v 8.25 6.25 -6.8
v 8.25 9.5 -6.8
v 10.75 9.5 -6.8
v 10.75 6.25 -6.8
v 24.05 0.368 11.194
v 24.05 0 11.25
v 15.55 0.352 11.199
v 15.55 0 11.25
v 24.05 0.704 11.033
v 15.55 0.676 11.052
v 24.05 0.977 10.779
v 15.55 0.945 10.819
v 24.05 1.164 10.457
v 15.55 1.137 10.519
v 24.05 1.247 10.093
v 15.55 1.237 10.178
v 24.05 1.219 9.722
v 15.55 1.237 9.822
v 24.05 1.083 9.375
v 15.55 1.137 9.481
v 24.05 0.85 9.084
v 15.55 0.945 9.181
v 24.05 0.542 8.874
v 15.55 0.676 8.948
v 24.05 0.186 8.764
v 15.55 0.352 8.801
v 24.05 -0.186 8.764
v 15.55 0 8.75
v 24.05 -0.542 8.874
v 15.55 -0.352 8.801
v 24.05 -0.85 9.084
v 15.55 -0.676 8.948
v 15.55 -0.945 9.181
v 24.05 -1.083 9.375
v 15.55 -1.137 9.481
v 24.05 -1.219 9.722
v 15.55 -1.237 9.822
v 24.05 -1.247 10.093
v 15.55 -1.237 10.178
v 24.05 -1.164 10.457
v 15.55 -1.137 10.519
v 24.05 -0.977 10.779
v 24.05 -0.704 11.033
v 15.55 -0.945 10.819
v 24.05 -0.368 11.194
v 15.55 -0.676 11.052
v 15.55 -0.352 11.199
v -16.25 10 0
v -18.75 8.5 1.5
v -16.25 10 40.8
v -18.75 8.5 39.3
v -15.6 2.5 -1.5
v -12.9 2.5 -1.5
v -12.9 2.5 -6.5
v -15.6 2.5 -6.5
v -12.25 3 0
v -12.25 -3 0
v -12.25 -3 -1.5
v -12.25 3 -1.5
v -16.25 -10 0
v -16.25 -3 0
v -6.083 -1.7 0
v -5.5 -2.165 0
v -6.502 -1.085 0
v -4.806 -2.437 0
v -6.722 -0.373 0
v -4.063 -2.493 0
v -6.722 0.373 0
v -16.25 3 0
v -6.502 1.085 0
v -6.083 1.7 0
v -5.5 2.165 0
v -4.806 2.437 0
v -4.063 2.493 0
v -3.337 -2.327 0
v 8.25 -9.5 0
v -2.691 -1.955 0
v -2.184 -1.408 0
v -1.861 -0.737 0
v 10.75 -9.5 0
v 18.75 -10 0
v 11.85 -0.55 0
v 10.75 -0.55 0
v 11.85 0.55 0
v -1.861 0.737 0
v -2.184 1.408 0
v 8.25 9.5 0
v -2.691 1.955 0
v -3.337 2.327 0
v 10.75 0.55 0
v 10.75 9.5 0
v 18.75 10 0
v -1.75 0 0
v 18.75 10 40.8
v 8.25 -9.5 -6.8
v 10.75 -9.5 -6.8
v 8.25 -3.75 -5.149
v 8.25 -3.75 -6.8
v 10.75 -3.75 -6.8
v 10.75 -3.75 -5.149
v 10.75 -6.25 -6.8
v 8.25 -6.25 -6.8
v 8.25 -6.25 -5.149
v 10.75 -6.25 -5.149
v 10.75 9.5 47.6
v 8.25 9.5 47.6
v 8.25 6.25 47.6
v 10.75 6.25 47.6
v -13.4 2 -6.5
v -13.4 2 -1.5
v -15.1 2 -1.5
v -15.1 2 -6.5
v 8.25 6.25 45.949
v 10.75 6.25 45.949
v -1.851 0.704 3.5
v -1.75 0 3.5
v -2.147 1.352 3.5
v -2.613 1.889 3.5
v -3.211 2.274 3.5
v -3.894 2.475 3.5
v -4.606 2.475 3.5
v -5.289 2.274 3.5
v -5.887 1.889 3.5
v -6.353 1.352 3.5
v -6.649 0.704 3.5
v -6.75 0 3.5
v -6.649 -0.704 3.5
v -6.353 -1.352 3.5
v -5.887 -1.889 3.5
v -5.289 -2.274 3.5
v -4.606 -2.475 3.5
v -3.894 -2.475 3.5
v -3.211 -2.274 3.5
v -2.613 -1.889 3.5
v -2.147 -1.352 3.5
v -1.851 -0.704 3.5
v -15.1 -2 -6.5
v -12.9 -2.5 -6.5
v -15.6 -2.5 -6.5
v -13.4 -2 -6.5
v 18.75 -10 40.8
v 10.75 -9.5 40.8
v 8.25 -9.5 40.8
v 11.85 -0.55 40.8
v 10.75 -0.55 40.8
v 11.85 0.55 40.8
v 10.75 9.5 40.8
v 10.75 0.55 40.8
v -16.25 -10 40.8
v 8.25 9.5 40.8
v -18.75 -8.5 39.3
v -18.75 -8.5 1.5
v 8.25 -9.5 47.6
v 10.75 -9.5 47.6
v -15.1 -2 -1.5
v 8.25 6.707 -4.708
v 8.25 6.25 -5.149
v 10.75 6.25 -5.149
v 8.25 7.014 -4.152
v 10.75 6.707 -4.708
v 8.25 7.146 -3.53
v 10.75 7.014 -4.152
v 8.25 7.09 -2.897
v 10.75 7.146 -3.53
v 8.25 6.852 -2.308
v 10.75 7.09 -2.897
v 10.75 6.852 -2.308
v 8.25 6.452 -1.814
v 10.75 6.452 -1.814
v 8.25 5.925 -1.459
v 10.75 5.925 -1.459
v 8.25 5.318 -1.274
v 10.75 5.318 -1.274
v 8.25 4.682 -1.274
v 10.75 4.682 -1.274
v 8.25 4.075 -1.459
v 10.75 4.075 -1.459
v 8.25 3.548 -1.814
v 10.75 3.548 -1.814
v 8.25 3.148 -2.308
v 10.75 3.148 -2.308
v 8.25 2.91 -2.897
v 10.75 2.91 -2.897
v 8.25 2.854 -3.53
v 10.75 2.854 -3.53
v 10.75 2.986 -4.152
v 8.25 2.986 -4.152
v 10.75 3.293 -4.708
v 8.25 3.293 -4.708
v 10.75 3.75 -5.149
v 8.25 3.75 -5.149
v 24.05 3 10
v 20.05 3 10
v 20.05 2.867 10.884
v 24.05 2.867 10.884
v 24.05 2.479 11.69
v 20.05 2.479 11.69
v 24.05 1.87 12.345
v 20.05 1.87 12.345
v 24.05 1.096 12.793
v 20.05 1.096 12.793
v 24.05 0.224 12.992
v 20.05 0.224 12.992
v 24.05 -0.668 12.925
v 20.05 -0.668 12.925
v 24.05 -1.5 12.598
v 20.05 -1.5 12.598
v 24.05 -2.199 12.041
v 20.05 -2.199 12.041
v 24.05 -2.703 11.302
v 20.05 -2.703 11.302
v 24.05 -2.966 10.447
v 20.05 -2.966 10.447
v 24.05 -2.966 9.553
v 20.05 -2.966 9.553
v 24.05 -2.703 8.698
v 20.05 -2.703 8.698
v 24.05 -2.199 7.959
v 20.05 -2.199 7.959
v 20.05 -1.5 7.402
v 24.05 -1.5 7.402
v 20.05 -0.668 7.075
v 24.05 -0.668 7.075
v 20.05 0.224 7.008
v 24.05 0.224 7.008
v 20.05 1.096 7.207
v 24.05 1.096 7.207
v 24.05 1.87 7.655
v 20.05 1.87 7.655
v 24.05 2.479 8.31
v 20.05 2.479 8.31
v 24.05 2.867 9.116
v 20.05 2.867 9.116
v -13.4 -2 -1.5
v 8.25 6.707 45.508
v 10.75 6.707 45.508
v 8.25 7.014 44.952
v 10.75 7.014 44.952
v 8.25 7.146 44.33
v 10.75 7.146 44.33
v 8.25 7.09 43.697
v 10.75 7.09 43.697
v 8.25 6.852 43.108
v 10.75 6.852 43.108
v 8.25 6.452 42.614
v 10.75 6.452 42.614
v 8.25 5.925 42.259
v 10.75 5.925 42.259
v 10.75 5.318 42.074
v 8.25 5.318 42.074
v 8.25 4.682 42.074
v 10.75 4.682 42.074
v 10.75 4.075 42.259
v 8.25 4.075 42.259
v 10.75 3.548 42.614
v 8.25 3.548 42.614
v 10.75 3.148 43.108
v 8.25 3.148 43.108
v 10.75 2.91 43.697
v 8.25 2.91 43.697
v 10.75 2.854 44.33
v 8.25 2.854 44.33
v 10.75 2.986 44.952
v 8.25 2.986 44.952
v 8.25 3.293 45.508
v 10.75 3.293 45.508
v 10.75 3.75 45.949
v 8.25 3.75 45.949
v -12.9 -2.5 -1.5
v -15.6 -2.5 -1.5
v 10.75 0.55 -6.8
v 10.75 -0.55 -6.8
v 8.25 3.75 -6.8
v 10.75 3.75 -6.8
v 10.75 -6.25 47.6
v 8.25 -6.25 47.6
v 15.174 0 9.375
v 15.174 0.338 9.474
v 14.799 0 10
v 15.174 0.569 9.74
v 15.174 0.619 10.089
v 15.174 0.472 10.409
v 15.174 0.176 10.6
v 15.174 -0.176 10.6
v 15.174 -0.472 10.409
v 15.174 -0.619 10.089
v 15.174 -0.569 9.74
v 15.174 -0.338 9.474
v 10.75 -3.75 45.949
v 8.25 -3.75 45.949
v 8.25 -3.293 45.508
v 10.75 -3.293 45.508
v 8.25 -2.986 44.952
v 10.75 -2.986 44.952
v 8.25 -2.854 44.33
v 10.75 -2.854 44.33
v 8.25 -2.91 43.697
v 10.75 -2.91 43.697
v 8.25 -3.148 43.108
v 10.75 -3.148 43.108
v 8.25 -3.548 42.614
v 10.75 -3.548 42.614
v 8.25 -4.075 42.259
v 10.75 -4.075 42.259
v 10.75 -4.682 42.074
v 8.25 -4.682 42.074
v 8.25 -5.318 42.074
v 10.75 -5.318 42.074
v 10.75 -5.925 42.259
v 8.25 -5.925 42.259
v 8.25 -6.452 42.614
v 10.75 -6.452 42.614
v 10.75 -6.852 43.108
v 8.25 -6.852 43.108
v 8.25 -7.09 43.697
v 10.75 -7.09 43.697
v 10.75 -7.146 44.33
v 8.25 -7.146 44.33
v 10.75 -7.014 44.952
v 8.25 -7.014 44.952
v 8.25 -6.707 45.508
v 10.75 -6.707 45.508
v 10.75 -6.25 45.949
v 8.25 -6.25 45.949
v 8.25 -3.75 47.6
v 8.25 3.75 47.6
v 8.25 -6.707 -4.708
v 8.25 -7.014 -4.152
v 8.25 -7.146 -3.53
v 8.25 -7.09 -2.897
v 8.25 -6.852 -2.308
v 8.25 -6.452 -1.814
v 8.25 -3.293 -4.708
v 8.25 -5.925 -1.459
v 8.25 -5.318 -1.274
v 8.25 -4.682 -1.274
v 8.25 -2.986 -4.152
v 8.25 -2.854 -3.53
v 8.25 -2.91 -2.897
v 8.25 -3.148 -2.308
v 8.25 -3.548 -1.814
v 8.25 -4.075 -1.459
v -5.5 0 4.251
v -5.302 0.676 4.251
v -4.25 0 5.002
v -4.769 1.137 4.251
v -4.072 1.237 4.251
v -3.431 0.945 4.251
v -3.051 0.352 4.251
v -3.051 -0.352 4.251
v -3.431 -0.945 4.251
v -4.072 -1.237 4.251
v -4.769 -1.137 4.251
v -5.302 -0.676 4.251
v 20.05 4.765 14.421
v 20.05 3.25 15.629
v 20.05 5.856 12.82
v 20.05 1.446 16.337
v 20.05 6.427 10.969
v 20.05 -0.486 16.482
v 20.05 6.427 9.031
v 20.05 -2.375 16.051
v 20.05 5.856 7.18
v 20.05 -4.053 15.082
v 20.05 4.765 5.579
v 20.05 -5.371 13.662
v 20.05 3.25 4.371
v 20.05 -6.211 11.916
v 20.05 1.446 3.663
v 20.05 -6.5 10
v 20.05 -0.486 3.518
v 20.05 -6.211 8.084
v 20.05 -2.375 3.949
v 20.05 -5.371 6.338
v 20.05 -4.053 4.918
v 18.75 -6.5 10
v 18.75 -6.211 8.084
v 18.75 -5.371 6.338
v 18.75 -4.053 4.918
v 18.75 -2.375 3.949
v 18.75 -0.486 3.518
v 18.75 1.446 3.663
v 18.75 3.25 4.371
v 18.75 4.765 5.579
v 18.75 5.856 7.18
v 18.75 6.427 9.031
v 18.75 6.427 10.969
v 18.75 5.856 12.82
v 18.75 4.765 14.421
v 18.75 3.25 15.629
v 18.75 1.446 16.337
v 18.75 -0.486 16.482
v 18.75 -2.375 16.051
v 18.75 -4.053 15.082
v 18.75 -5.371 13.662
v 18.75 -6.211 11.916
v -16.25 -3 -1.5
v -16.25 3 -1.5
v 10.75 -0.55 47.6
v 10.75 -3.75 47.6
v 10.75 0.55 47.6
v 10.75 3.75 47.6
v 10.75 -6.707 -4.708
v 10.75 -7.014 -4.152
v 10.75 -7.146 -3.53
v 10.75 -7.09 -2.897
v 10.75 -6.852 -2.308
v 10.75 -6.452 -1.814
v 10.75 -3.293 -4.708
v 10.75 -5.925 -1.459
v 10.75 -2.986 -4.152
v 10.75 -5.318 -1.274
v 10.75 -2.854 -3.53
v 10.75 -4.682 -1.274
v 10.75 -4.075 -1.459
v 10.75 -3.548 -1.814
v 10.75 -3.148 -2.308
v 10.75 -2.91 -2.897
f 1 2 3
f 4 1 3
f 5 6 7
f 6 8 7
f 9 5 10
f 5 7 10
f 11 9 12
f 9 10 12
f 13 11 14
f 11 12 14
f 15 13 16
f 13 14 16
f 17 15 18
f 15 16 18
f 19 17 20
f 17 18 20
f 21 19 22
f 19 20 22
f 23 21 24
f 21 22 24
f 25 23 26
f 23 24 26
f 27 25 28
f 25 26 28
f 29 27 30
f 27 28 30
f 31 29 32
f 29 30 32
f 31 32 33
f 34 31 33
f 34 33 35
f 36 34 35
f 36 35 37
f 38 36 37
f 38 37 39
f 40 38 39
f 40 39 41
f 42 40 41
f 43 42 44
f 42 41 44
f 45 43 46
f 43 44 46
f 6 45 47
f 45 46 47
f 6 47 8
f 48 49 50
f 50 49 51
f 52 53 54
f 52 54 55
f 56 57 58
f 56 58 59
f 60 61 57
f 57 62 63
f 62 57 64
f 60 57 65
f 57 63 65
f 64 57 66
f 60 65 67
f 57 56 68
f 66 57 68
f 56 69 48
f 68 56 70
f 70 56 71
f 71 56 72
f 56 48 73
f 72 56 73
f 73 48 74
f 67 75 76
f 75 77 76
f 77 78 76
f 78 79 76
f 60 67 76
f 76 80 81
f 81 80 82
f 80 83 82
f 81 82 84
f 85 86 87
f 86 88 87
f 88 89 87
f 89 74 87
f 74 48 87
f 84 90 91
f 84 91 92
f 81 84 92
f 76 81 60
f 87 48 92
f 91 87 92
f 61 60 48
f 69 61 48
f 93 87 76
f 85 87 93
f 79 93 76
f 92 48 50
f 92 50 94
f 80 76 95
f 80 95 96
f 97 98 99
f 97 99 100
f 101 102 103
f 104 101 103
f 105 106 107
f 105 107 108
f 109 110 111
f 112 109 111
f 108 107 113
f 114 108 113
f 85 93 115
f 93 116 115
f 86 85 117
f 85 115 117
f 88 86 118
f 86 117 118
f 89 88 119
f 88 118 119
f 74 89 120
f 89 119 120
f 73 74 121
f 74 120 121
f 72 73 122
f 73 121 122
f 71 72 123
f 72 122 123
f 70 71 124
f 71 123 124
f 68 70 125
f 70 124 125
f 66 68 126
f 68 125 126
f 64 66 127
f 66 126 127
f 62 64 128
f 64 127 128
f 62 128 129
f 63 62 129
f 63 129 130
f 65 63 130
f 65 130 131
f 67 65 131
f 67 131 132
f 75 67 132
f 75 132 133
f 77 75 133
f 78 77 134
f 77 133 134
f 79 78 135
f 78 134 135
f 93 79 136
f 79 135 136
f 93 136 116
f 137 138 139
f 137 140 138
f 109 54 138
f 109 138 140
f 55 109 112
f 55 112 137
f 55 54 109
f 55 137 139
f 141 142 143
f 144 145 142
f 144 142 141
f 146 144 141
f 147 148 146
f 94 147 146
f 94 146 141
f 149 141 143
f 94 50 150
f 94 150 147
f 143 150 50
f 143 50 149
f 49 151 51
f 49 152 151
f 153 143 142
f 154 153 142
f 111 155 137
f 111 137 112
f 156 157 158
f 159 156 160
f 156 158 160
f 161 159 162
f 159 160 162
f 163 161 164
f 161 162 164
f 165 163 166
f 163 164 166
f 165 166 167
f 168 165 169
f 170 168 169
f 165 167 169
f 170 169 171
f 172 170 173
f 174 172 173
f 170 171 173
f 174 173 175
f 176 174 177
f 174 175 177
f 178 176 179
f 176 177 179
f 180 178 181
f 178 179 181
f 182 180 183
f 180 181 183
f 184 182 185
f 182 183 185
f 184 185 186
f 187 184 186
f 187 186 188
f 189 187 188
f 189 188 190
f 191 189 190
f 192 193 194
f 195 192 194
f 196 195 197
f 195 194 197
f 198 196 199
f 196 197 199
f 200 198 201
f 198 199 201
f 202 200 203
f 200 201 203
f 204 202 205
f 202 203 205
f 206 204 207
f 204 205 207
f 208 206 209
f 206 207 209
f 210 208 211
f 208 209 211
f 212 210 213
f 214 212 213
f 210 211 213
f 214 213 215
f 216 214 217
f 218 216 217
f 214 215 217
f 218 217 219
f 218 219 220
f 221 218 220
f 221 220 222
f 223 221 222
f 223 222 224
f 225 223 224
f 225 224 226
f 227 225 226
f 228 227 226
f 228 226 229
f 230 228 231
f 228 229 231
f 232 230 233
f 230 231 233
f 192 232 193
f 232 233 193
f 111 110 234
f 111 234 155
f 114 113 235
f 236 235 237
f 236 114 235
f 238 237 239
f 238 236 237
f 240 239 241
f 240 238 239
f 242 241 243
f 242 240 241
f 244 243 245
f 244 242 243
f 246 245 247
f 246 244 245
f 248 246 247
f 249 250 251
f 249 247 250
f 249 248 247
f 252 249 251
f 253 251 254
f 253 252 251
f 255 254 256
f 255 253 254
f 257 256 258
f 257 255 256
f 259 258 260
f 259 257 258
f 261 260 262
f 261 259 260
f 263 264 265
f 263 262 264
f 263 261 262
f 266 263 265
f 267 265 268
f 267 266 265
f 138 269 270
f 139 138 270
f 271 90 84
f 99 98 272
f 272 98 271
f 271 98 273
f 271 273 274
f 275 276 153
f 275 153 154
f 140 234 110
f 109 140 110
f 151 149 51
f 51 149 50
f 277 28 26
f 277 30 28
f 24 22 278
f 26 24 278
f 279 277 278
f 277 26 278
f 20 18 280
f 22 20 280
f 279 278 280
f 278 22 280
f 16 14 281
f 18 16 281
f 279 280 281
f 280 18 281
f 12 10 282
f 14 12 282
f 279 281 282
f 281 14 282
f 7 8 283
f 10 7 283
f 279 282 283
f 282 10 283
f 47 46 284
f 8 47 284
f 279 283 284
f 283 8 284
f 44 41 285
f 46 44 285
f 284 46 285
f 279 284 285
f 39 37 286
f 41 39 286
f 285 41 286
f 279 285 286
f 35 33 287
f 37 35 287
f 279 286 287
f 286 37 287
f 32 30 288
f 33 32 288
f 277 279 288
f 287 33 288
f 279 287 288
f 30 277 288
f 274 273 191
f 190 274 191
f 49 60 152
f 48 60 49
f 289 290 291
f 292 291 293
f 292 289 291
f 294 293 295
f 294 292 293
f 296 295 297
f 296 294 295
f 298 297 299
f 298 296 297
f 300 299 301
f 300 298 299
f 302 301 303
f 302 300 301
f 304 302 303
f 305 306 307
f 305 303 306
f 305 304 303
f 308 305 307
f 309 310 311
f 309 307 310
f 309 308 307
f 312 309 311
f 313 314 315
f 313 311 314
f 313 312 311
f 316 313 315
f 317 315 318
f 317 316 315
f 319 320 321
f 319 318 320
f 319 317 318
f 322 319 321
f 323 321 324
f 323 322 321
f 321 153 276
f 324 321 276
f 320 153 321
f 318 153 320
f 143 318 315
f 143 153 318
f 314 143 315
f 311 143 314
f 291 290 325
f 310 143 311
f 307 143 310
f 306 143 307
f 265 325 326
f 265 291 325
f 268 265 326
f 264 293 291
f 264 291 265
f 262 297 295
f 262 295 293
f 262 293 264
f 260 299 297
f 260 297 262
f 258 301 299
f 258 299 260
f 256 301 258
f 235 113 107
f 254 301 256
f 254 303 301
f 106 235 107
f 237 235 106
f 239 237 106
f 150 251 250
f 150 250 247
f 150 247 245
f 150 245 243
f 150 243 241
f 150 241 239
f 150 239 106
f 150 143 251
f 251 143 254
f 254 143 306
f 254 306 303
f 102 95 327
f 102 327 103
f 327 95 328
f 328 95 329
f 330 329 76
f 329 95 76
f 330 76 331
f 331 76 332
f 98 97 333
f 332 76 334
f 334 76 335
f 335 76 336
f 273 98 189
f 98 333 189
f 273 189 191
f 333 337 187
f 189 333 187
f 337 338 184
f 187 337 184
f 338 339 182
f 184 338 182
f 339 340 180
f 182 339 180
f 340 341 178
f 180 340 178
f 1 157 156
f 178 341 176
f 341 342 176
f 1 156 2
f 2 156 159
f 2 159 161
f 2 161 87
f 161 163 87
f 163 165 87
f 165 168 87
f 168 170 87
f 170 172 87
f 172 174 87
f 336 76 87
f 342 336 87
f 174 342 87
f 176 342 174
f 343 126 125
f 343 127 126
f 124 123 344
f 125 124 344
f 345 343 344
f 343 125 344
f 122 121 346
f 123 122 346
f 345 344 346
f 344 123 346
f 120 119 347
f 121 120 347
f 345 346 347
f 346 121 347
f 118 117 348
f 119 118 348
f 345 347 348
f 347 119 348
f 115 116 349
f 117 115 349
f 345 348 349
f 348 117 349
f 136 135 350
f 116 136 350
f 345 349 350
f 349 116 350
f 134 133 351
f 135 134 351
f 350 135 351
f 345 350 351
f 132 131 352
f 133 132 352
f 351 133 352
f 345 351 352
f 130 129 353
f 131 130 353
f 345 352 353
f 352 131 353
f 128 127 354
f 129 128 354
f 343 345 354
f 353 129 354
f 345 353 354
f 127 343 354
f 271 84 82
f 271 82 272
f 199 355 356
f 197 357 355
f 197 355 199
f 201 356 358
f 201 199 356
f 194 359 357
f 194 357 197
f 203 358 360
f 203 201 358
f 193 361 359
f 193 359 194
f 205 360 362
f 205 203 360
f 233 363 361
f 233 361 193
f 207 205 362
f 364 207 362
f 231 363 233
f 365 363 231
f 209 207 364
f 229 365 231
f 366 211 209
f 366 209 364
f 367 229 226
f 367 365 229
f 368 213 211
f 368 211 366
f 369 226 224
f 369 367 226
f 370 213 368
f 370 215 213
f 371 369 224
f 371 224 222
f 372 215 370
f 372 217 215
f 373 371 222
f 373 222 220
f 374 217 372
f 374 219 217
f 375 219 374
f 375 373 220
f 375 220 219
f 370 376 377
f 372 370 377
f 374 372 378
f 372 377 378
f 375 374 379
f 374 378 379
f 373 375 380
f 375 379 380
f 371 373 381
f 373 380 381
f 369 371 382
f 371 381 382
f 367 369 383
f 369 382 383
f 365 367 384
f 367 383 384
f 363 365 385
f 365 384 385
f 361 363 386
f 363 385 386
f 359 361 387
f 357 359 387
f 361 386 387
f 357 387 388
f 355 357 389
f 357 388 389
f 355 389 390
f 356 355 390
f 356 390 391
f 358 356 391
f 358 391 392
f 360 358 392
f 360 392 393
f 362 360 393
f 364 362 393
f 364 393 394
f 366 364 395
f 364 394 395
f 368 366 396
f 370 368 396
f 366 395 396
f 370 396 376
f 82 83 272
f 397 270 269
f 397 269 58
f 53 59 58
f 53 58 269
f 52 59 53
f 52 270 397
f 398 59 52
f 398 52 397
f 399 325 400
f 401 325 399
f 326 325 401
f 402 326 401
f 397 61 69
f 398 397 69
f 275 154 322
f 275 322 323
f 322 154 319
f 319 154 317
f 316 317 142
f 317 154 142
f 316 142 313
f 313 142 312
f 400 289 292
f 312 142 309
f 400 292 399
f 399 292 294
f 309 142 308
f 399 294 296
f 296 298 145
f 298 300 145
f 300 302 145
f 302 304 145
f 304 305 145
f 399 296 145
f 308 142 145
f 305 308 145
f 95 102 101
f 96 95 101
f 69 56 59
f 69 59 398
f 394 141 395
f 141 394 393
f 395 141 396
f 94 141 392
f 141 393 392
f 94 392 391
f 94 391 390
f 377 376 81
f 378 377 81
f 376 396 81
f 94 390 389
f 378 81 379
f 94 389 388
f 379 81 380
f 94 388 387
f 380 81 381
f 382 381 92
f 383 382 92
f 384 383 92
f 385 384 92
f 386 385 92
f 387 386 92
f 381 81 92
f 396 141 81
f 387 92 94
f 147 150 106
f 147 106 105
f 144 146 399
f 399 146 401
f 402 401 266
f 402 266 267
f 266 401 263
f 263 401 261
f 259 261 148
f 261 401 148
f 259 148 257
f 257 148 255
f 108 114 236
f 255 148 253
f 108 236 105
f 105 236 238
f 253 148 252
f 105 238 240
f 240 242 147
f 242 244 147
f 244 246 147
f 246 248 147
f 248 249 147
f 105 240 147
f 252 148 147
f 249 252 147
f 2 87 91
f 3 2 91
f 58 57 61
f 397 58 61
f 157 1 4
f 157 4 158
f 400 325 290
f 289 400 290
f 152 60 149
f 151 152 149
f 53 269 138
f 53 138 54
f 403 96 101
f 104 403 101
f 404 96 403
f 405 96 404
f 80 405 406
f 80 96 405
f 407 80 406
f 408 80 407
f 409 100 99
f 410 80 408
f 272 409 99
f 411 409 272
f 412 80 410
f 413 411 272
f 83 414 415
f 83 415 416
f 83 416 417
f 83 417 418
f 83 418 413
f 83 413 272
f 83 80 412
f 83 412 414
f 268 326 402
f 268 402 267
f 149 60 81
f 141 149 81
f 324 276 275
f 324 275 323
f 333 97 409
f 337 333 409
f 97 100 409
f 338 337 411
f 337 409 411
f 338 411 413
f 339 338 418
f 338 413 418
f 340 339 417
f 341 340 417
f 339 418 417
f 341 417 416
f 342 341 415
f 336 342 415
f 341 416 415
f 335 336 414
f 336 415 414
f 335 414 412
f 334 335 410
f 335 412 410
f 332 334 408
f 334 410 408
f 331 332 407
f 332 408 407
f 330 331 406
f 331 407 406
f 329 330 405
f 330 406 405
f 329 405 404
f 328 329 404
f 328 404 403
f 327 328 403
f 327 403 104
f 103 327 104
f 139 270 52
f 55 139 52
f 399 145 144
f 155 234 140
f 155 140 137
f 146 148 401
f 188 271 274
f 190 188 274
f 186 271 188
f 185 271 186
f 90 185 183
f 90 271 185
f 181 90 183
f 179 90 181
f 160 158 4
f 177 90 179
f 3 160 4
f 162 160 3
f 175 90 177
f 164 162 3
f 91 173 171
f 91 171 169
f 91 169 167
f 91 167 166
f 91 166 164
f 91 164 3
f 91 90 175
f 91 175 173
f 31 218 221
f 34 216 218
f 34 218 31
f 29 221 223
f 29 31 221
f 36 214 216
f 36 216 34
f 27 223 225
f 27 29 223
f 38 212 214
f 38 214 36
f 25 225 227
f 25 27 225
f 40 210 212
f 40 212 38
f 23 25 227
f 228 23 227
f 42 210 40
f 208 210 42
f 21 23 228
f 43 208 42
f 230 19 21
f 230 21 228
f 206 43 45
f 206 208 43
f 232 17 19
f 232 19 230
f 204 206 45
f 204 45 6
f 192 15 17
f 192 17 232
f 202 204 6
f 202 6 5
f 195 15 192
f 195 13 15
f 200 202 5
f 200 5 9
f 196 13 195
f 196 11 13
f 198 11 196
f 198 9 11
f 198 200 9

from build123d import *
from OCP.BRepFilletAPI import BRepFilletAPI_MakeChamfer

# Parameters (mm, degrees)
SKIZZE1_W                           = 37.5
SKIZZE1_H                           = 20
AUFSATZ_LINEAR_AUSTRAGEN1_DEPTH     = 40.8
SKIZZE2_W                           = 2.5
SKIZZE2_H                           = 19
AUFSATZ_LINEAR_AUSTRAGEN2_DEPTH     = 6.8
F_4_3_4_3_DIAMETER_HOLE2_AT_2_COUNT = 2
F_4_3_4_3_DIAMETER_HOLE2_AT_2_PITCH = 10
CUT_EXTRUDE1_REACH                  = 58.886
SKETCH1_W                           = 3
SKETCH1_H                           = 2.5
BOSS_EXTRUDE1_DEPTH                 = 0.55
SKIZZE5_R                           = 6.5
AUFSATZ_LINEAR_AUSTRAGEN3_DEPTH     = 1.3
SKIZZE6_R                           = 3
AUFSATZ_LINEAR_AUSTRAGEN4_DEPTH     = 4
SKIZZE7_W                           = 4
SKIZZE7_H                           = 6
AUFSATZ_LINEAR_AUSTRAGEN5_DEPTH     = 1.5
SKIZZE8_W                           = 2.7
SKIZZE8_H                           = 5
SKIZZE8_W_2                         = 1.7
SKIZZE8_H_2                         = 4
AUFSATZ_LINEAR_AUSTRAGEN6_DEPTH     = 5
F_5_0_5_DIAMETER_HOLE1_D            = 5
F_5_0_5_DIAMETER_HOLE1_DEPTH        = 3.5
F_5_0_5_DIAMETER_HOLE1_TIP          = 1.502151548
M3_GEWINDEBOHRUNG1_D                = 2.5
M3_GEWINDEBOHRUNG1_DEPTH            = 8.5
M3_GEWINDEBOHRUNG1_TIP              = 0.751075774
CHAMFER1_SIZE                       = 1.5
CHAMFER1_SIZE_2                     = 2.5


with BuildPart() as part:
    # Skizze1 → Aufsatz-Linear austragen1 (new body)
    with BuildSketch(Plane.XY):
        Rectangle(SKIZZE1_W, SKIZZE1_H)
    extrude(amount=AUFSATZ_LINEAR_AUSTRAGEN1_DEPTH)

    # Skizze2 → Aufsatz-Linear austragen2 (add)
    with BuildSketch(Plane.XY.offset(40.8)):
        with Locations((9.5, 0)):
            Rectangle(SKIZZE2_W, SKIZZE2_H)
    aufsatz_linear_austragen2 = extrude(amount=AUFSATZ_LINEAR_AUSTRAGEN2_DEPTH)

    # Skizze3 → Ø4.3 (4.3) Diameter Hole2 (revolve, cut)
    with BuildSketch(Plane(origin=(10.75, 5, 44.2), x_dir=(0, 0, -1), z_dir=(0, 1, 0))):
        Polygon((0, 0), (0, 11.291850331), (2.15, 10), (2.15, 0), align=None)
    f_4_3_4_3_diameter_hole2 = revolve(axis=Axis((17.1, 5, 44.2), (-1, 0, 0)), mode=Mode.SUBTRACT)

    # Ø4.3 (4.3) Diameter Hole2 at 2: Ø4.3 (4.3) Diameter Hole2 ×2
    with Locations(*[(0, -i * F_4_3_4_3_DIAMETER_HOLE2_AT_2_PITCH, 0) for i in range(1, F_4_3_4_3_DIAMETER_HOLE2_AT_2_COUNT)]):
        add(f_4_3_4_3_diameter_hole2, mode=Mode.SUBTRACT)

    # Sketch1 → Cut-Extrude1 (cut, up to next)
    with BuildSketch(Plane(origin=(10.75, 0, 0), x_dir=(0, 0, -1), z_dir=(1, 0, 0)), mode=Mode.PRIVATE) as cut_extrude1_sk1:
        with Locations((-47.05, 5)):
            Rectangle(SKETCH1_W, SKETCH1_H)
    cut_extrude1_tool1 = extrude(cut_extrude1_sk1.sketch, amount=-CUT_EXTRUDE1_REACH, mode=Mode.PRIVATE) & part.part
    # Sketch1 → Cut-Extrude1 (cut, up to next)
    with BuildSketch(Plane(origin=(10.75, 0, 0), x_dir=(0, 0, -1), z_dir=(1, 0, 0)), mode=Mode.PRIVATE) as cut_extrude1_sk2:
        with Locations((-47.05, -5)):
            Rectangle(SKETCH1_W, SKETCH1_H)
    cut_extrude1_tool2 = extrude(cut_extrude1_sk2.sketch, amount=-CUT_EXTRUDE1_REACH, mode=Mode.PRIVATE) & part.part
    cut_extrude1_1 = cut_extrude1_tool1.solids().sort_by_distance((10.75, 5, 47.05))[0]
    add(cut_extrude1_1, mode=Mode.SUBTRACT)
    cut_extrude1_2 = cut_extrude1_tool2.solids().sort_by_distance((10.75, -5, 47.05))[0]
    add(cut_extrude1_2, mode=Mode.SUBTRACT)
    cut_extrude1 = cut_extrude1_1 + cut_extrude1_2  # Cut-Extrude1 as one shape, for the pattern or mirror that repeats it

    # Spiegeln2: Aufsatz-Linear austragen2, Ø4.3 (4.3) Diameter Hole2, Cut-Extrude1 across plane
    add(aufsatz_linear_austragen2.mirror(Plane(origin=(0, 0, 20.4), x_dir=(1, 0, 0), z_dir=(0, 0, -1))))
    add(f_4_3_4_3_diameter_hole2.mirror(Plane(origin=(0, 0, 20.4), x_dir=(1, 0, 0), z_dir=(0, 0, -1))), mode=Mode.SUBTRACT)
    add(cut_extrude1.mirror(Plane(origin=(0, 0, 20.4), x_dir=(1, 0, 0), z_dir=(0, 0, -1))), mode=Mode.SUBTRACT)

    # Spiegeln2 copy 1 sketch → Spiegeln2 copy 1 (revolve, cut)
    with BuildSketch(Plane(origin=(10.75, -5, -3.4), x_dir=(0, 0, 1), z_dir=(0, 1, 0))):
        Polygon((0, 0), (0, -11.291850331), (2.15, -10), (2.15, 0), align=None)
    revolve(axis=Axis((17.1, -5, -3.4), (1, 0, 0)), mode=Mode.SUBTRACT)

    # Sketch3 → Boss-Extrude1 (add, symmetric)
    with BuildSketch(Plane(origin=(0, 0, 0), x_dir=(1, 0, 0), z_dir=(0, 1, 0))):
        Polygon((10.75, 0), (11.85, 0), (10.75, 6.8), align=None)
    boss_extrude1 = extrude(amount=BOSS_EXTRUDE1_DEPTH, both=True)

    # Skizze5 → Aufsatz-Linear austragen3 (add)
    with BuildSketch(Plane(origin=(18.75, 0, 0), x_dir=(0, 0, -1), z_dir=(1, 0, 0))):
        with Locations(Location((-10, 0, 0), (0, 0, 270))):
            Circle(SKIZZE5_R)
    extrude(amount=AUFSATZ_LINEAR_AUSTRAGEN3_DEPTH)

    # Skizze6 → Aufsatz-Linear austragen4 (add)
    with BuildSketch(Plane(origin=(20.05, 0, 0), x_dir=(0, 0, -1), z_dir=(1, 0, 0))):
        with Locations(Location((-10, 0, 0), (0, 0, 90))):
            Circle(SKIZZE6_R)
    extrude(amount=AUFSATZ_LINEAR_AUSTRAGEN4_DEPTH)

    # Skizze7 → Aufsatz-Linear austragen5 (add)
    with BuildSketch(Plane(origin=(0, 0, 0), x_dir=(-1, 0, 0), z_dir=(0, 0, -1))):
        with Locations((14.25, 0)):
            Rectangle(SKIZZE7_W, SKIZZE7_H)
    extrude(amount=AUFSATZ_LINEAR_AUSTRAGEN5_DEPTH)

    # Skizze8 → Aufsatz-Linear austragen6 (add)
    with BuildSketch(Plane(origin=(0, 0, -1.5), x_dir=(-1, 0, 0), z_dir=(0, 0, -1))):
        with Locations((14.25, 0)):
            Rectangle(SKIZZE8_W, SKIZZE8_H)
        with Locations((14.25, 0)):
            Rectangle(SKIZZE8_W_2, SKIZZE8_H_2, mode=Mode.SUBTRACT)
    extrude(amount=AUFSATZ_LINEAR_AUSTRAGEN6_DEPTH)

    # Ø5.0 (5) Diameter Hole1
    with Locations(Plane(origin=(0, 0, 0), x_dir=(-1, 0, 0), z_dir=(0, 0, -1))):
        with Locations((4.25, 0)):
            Hole(F_5_0_5_DIAMETER_HOLE1_D / 2, depth=F_5_0_5_DIAMETER_HOLE1_DEPTH)
            with Locations((0, 0, -(F_5_0_5_DIAMETER_HOLE1_DEPTH + F_5_0_5_DIAMETER_HOLE1_TIP / 2))):  # 118° drill point
                Cone(0, F_5_0_5_DIAMETER_HOLE1_D / 2, F_5_0_5_DIAMETER_HOLE1_TIP, mode=Mode.SUBTRACT)

    # M3 Gewindebohrung1
    with Locations(Plane(origin=(24.05, 0, 0), x_dir=(0, 0, -1), z_dir=(1, 0, 0))):
        with Locations((-10, 0)):
            Hole(M3_GEWINDEBOHRUNG1_D / 2, depth=M3_GEWINDEBOHRUNG1_DEPTH)
            with Locations((0, 0, -(M3_GEWINDEBOHRUNG1_DEPTH + M3_GEWINDEBOHRUNG1_TIP / 2))):  # 118° drill point
                Cone(0, M3_GEWINDEBOHRUNG1_D / 2, M3_GEWINDEBOHRUNG1_TIP, mode=Mode.SUBTRACT)

    # Mirror1: Boss-Extrude1 across plane
    add(boss_extrude1.mirror(Plane(origin=(0, 0, 20.4), x_dir=(1, 0, 0), z_dir=(0, 0, -1))))

    # Chamfer1
    chamfer1_edges_1 = [part.edges().sort_by_distance(p)[0] for p in [
        (-18.75, 0, 40.8),
    ]]
    chamfer1_side_1 = [part.faces().sort_by_distance(p)[0] for p in [
        (-18.75, 0, 40.77),
    ]]
    chamfer1_edges_2 = [part.edges().sort_by_distance(p)[0] for p in [
        (-18.75, 0, 0),
    ]]
    chamfer1_side_2 = [part.faces().sort_by_distance(p)[0] for p in [
        (-18.75, 0, 0.03),
    ]]
    chamfer1_edges_3 = [part.edges().sort_by_distance(p)[0] for p in [
        (-18.75, 10, 20.4),
    ]]
    chamfer1_side_3 = [part.faces().sort_by_distance(p)[0] for p in [
        (-18.72, 10, 20.4),
    ]]
    chamfer1_edges_4 = [part.edges().sort_by_distance(p)[0] for p in [
        (-18.75, -10, 20.4),
    ]]
    chamfer1_side_4 = [part.faces().sort_by_distance(p)[0] for p in [
        (-18.75, -9.97, 20.4),
    ]]
    chamfer1 = BRepFilletAPI_MakeChamfer(part.part.solid().wrapped)
    for e in chamfer1_edges_1:
        chamfer1.Add(CHAMFER1_SIZE - 0.0001, CHAMFER1_SIZE_2 - 0.0001, e.wrapped, chamfer1_side_1[0].wrapped)
    for e in chamfer1_edges_2:
        chamfer1.Add(CHAMFER1_SIZE - 0.0001, CHAMFER1_SIZE_2 - 0.0001, e.wrapped, chamfer1_side_2[0].wrapped)
    for e in chamfer1_edges_3:
        chamfer1.Add(CHAMFER1_SIZE_2 - 0.0001, CHAMFER1_SIZE - 0.0001, e.wrapped, chamfer1_side_3[0].wrapped)
    for e in chamfer1_edges_4:
        chamfer1.Add(CHAMFER1_SIZE - 0.0001, CHAMFER1_SIZE_2 - 0.0001, e.wrapped, chamfer1_side_4[0].wrapped)
    add(Compound.cast(chamfer1.Shape()), mode=Mode.REPLACE)  # a hair under: the kernel refuses the full size


solid = part.part
